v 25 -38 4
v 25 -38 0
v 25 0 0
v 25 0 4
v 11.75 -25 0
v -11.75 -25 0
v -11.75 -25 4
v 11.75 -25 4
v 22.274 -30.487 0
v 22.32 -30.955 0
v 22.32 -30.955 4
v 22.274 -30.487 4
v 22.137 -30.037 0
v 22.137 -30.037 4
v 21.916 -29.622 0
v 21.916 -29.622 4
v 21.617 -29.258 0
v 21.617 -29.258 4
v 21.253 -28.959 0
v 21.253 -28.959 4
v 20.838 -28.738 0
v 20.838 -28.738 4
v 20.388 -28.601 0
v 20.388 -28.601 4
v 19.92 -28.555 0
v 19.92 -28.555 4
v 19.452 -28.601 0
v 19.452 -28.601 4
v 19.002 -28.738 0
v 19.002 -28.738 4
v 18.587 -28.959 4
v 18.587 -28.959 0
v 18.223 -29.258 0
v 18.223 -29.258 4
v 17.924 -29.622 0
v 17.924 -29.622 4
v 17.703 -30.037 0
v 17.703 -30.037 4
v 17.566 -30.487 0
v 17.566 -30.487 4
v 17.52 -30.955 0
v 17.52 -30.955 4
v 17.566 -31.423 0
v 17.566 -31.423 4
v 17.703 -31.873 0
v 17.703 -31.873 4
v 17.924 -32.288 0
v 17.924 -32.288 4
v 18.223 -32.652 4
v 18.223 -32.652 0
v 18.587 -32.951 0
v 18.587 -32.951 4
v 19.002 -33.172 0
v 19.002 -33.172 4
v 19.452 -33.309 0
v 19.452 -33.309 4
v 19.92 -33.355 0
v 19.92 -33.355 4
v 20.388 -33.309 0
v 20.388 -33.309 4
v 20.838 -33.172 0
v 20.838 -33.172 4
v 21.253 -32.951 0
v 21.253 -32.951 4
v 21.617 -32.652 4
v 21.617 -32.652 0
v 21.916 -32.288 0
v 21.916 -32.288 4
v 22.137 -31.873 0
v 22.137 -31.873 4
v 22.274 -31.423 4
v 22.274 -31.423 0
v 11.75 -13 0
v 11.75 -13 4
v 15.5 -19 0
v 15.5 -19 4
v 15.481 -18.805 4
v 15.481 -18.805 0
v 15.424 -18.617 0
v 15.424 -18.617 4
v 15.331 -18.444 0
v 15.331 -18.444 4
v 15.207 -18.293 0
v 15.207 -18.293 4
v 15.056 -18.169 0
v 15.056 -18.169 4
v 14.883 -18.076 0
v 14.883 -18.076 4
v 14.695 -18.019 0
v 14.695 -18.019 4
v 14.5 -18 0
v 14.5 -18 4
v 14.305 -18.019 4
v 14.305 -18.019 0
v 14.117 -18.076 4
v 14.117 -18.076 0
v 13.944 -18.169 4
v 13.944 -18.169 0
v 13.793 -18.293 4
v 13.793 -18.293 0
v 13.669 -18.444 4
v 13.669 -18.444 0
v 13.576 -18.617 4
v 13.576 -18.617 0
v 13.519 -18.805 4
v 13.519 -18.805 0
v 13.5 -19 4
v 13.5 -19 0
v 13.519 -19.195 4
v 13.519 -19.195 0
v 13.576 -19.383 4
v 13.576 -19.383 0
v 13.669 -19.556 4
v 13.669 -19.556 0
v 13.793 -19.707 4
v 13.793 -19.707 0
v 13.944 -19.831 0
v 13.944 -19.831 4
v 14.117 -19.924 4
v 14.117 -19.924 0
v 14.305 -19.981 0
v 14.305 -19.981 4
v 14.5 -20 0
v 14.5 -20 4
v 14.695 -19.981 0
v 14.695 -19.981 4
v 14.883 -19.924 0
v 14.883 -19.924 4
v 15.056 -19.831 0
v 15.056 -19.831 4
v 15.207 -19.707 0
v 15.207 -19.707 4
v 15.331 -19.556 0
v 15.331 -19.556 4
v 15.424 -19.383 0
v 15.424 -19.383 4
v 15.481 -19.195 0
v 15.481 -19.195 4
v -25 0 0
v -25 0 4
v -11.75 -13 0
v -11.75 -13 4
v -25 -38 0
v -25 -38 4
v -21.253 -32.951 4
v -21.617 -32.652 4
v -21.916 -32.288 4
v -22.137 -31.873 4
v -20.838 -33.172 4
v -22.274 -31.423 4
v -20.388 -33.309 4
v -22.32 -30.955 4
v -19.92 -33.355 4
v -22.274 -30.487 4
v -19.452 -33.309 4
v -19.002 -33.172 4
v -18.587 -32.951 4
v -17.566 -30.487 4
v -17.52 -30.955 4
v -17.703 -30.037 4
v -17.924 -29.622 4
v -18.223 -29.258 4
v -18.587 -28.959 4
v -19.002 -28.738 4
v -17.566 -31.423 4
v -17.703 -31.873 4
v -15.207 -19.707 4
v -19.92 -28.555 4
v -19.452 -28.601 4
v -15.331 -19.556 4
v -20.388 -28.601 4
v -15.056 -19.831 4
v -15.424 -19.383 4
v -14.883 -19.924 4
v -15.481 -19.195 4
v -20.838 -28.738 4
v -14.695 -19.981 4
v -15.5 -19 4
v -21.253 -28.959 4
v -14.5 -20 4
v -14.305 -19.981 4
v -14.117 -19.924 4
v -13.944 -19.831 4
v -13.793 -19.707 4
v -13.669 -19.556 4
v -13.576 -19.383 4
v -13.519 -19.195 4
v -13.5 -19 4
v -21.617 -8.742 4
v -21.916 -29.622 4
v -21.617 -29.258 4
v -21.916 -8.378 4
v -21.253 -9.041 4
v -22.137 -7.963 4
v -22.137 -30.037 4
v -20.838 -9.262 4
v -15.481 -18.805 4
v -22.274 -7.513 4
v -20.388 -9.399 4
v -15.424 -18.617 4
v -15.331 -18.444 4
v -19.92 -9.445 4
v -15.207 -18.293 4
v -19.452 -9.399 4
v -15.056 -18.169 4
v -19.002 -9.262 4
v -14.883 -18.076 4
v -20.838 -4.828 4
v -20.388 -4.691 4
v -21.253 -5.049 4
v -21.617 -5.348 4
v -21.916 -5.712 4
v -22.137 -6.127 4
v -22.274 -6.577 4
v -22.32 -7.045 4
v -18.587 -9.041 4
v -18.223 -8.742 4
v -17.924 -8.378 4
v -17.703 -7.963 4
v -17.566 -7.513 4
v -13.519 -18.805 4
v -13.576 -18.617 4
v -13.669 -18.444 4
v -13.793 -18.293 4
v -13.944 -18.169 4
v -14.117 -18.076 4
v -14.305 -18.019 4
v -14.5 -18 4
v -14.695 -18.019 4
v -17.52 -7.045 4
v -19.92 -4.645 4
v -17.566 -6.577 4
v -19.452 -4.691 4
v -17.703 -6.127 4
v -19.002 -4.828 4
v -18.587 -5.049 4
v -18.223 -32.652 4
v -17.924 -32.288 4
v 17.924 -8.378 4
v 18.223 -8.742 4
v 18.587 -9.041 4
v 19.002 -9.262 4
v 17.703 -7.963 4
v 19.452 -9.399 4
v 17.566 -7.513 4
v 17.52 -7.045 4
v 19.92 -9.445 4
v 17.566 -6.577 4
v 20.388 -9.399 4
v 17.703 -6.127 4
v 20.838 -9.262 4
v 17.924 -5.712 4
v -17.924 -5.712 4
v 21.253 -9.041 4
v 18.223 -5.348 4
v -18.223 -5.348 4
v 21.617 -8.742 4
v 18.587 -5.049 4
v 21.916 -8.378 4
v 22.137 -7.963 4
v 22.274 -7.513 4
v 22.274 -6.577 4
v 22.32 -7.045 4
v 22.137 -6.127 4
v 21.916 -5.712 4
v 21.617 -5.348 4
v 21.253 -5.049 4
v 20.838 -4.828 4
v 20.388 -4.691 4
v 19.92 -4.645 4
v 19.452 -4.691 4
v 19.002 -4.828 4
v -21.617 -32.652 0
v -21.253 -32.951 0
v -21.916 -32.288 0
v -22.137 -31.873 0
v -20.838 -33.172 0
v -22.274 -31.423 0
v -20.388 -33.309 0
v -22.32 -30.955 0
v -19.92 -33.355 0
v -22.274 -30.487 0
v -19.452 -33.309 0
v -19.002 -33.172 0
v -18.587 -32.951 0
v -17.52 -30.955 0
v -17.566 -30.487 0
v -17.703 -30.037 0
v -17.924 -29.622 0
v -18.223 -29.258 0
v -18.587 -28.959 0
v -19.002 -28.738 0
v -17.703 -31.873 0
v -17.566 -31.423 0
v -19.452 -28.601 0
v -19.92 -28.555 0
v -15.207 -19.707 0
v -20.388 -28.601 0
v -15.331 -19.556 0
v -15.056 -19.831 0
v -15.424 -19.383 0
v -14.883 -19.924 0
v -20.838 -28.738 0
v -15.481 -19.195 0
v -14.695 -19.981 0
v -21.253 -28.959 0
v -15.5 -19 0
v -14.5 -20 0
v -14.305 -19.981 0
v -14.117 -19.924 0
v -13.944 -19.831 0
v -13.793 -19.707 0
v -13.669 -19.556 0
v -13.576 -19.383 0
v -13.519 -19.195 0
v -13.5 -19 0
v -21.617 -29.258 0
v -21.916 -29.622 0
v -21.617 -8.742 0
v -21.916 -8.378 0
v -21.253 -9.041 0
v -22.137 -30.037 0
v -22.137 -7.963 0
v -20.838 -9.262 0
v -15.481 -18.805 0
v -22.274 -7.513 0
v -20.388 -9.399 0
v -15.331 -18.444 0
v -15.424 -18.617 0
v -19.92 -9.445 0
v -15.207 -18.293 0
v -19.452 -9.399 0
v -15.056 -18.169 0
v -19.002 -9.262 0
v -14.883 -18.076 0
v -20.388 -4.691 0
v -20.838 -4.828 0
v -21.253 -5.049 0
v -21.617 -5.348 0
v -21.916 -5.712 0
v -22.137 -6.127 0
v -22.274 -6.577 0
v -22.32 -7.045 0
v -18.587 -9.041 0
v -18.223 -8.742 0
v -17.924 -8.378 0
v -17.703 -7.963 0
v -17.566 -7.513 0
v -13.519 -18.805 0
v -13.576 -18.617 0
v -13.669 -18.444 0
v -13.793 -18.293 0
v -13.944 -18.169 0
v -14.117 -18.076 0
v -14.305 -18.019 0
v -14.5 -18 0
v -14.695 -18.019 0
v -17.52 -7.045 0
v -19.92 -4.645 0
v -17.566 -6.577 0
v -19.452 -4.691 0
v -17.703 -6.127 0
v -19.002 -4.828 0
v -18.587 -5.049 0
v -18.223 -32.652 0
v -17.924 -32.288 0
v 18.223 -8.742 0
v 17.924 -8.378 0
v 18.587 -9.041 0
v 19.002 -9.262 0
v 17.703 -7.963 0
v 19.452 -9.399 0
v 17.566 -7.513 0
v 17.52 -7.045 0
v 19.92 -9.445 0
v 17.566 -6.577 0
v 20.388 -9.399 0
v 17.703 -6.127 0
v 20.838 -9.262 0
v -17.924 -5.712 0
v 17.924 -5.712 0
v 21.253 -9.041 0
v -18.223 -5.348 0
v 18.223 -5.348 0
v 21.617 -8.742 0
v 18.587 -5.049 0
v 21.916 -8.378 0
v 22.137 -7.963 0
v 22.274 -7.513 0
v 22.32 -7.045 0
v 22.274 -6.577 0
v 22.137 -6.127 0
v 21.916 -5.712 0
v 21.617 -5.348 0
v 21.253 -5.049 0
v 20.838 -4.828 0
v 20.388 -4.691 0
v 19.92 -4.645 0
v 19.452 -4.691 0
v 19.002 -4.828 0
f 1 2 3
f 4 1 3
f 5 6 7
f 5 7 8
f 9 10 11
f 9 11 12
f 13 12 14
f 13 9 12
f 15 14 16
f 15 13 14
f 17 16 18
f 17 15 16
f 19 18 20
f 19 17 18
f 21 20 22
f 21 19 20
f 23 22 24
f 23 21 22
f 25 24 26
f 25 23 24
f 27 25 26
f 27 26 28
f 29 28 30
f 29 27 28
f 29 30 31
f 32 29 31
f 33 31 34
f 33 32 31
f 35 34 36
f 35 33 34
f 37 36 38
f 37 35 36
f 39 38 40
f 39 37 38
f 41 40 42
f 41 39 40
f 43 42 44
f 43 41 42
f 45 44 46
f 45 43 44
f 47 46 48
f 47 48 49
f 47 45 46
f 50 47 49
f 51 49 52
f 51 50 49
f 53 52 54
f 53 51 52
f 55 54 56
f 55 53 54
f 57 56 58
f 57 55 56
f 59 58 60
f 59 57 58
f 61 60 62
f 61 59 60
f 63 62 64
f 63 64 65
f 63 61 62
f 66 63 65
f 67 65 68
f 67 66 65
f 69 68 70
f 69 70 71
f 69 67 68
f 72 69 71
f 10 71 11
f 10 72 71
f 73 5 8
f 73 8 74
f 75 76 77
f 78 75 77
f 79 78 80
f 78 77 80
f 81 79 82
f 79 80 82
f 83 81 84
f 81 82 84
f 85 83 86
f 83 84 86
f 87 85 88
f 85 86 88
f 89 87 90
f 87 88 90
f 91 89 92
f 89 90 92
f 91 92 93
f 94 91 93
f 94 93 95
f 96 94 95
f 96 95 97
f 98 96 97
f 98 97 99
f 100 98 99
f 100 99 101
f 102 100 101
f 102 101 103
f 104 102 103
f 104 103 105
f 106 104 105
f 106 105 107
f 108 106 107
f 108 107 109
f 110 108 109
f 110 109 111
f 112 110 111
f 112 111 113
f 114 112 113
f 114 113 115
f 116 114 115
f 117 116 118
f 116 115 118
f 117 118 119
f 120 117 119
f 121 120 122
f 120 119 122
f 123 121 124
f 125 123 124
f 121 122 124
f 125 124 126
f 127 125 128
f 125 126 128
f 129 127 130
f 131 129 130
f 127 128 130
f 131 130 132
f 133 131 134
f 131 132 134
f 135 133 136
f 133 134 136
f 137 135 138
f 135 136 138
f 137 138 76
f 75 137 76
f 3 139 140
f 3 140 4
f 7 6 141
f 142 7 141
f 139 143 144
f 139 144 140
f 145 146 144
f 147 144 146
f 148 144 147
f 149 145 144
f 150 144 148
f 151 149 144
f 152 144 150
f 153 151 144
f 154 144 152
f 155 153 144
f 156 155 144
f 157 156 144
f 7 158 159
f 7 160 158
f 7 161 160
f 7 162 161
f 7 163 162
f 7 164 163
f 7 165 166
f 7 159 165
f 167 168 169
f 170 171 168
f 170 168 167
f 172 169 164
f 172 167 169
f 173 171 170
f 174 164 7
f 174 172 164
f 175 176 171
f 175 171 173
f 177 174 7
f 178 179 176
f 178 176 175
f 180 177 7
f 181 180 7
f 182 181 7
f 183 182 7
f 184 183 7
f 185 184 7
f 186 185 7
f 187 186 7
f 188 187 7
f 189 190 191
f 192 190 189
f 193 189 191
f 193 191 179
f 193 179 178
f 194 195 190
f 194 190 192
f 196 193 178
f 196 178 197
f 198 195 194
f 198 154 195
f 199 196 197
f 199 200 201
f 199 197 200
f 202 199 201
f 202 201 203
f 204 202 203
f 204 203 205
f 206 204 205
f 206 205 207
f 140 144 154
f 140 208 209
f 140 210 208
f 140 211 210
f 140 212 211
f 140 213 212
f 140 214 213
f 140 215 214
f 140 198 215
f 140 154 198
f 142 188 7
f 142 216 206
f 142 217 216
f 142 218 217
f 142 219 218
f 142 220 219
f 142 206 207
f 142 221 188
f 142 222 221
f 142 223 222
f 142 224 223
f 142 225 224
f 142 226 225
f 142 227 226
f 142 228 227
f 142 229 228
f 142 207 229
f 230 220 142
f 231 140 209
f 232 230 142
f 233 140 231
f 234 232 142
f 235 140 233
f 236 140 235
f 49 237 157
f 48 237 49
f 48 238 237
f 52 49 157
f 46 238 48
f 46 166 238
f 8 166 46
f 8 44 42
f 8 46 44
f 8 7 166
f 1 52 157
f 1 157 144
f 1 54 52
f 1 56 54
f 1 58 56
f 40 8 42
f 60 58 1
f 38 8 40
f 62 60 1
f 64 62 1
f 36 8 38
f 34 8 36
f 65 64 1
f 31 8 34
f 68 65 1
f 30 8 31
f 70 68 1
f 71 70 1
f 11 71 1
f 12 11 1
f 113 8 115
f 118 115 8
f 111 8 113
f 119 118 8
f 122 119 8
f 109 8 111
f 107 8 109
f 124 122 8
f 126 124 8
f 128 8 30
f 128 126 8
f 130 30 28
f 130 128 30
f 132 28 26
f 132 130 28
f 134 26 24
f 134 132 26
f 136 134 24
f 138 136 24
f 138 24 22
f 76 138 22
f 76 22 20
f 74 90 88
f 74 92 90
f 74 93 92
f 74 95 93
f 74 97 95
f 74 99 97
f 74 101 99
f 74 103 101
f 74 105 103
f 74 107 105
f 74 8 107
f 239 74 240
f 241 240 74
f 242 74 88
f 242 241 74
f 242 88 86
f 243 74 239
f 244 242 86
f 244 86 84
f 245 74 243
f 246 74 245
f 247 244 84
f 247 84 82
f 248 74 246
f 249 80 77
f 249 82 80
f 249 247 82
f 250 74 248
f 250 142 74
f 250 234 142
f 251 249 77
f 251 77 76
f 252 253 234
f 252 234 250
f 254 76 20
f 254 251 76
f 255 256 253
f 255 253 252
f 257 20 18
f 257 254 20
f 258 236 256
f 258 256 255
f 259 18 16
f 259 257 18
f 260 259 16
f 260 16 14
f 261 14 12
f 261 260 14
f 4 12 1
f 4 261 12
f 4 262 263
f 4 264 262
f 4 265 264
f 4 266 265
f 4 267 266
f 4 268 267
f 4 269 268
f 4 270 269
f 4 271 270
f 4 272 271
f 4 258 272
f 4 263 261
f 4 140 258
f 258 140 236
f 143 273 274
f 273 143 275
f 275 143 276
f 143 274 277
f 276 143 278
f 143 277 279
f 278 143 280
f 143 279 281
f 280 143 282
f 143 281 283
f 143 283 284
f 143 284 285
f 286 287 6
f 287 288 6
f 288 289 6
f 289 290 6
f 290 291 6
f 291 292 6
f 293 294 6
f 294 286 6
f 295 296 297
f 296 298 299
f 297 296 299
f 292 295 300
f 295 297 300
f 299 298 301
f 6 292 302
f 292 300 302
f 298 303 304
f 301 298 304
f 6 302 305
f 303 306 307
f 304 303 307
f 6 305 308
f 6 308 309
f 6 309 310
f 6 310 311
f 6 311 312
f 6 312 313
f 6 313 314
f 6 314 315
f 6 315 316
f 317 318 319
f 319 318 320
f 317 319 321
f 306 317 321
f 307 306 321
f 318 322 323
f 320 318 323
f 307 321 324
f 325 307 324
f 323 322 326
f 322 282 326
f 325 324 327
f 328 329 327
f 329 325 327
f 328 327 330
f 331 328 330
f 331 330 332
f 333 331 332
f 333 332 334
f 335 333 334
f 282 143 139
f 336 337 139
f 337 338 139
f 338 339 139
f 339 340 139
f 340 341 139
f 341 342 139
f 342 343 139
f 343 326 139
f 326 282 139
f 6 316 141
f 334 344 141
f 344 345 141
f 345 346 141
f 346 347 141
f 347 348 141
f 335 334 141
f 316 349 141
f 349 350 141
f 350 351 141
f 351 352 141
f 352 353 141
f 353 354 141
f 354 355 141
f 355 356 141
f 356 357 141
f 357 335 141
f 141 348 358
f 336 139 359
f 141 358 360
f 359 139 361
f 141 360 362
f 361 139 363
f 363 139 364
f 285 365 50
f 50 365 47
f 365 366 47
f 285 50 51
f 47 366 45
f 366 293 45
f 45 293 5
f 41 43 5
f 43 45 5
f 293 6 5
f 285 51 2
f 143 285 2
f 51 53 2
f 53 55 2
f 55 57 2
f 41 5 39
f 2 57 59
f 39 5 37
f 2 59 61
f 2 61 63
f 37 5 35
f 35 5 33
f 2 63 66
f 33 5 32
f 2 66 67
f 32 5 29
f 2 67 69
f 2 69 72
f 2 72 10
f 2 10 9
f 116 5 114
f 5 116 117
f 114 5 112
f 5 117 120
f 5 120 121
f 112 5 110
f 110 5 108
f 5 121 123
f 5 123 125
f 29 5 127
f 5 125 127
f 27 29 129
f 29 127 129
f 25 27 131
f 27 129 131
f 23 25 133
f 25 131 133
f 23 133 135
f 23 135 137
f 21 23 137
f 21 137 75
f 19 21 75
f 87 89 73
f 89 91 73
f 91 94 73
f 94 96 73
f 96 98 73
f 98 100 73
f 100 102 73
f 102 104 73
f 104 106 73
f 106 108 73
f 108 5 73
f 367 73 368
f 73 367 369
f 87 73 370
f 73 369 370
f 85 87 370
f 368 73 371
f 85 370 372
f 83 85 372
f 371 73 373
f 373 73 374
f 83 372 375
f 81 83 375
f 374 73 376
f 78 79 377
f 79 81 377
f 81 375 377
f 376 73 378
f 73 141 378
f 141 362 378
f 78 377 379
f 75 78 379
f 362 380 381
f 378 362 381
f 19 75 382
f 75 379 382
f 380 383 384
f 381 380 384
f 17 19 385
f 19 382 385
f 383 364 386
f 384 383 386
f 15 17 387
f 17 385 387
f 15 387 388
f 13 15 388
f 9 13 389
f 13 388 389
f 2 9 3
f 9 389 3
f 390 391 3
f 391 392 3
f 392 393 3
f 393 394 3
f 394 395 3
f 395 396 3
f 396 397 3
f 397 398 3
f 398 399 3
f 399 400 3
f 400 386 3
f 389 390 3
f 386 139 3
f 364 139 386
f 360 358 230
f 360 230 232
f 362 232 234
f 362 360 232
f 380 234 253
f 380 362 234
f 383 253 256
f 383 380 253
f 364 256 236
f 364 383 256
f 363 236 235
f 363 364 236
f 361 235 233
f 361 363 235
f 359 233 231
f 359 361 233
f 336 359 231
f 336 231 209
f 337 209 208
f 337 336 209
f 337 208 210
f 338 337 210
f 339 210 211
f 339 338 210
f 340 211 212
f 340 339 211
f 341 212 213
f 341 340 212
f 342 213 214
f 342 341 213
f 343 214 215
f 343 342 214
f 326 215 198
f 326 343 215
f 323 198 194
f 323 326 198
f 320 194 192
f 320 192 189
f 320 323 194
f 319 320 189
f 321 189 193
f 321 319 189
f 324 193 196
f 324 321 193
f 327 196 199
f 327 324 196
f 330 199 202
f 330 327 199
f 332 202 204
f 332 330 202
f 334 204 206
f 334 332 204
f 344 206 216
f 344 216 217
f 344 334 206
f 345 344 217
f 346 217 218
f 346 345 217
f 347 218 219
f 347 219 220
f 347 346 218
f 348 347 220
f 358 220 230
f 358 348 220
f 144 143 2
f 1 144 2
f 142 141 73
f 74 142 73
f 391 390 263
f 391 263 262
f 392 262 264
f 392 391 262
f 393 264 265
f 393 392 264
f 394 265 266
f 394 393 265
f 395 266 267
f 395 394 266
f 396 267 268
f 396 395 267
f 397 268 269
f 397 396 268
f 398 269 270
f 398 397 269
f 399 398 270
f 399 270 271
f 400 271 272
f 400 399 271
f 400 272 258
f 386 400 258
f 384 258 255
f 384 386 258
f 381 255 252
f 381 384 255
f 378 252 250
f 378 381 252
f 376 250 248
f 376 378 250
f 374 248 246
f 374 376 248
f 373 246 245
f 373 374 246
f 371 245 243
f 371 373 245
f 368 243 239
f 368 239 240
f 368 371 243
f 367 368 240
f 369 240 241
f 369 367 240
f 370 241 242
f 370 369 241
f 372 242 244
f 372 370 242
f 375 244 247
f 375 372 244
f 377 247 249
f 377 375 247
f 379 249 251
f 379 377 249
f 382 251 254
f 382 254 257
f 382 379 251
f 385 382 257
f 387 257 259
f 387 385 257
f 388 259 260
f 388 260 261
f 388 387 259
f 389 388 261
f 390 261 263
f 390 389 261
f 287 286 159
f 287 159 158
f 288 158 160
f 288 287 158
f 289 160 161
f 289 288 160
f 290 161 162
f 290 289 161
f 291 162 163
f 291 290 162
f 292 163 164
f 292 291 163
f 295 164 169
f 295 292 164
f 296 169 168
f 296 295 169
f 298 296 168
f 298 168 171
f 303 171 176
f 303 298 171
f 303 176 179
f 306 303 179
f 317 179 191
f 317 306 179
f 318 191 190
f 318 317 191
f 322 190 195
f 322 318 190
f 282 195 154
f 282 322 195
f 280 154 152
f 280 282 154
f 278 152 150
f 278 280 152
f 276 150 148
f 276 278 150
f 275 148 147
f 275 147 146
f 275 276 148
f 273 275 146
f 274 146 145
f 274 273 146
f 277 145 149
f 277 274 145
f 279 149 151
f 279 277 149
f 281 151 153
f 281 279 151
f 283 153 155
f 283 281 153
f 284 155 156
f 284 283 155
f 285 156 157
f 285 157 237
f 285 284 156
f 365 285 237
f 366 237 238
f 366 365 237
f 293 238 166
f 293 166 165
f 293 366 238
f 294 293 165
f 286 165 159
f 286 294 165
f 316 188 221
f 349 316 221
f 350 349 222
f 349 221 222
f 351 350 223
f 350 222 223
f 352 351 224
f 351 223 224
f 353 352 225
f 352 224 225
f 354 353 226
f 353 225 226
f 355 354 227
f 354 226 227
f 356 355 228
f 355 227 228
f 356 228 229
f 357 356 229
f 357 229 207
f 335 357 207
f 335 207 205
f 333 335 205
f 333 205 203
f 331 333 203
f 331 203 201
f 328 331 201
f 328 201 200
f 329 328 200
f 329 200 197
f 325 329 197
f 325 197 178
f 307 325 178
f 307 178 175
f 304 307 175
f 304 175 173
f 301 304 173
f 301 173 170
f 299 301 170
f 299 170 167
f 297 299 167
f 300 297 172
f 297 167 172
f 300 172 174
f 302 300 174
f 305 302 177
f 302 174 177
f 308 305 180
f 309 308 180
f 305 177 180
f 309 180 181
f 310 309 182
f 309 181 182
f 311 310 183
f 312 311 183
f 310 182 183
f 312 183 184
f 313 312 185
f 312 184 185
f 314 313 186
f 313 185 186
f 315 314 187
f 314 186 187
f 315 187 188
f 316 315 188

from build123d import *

# Parameters (mm, degrees)
SKETCH1_W           = 50
SKETCH1_H           = 38
SKETCH1_R           = 2.4
SKETCH1_W_2         = 23.5
SKETCH1_H_2         = 12
BOSS_EXTRUDE1_DEPTH = 4
CUT_EXTRUDE1_REACH  = 6
SKETCH2_R           = 1


with BuildPart() as part:
    # Sketch1 → Boss-Extrude1 (new body)
    with BuildSketch(Plane.XY):
        with Locations((0, -19)):
            Rectangle(SKETCH1_W, SKETCH1_H)
        with Locations((-19.92, -7.045)):
            Circle(SKETCH1_R, mode=Mode.SUBTRACT)
        with Locations((-19.92, -30.955)):
            Circle(SKETCH1_R, mode=Mode.SUBTRACT)
        with Locations((19.92, -30.955)):
            Circle(SKETCH1_R, mode=Mode.SUBTRACT)
        with Locations((19.92, -7.045)):
            Circle(SKETCH1_R, mode=Mode.SUBTRACT)
        with Locations((0, -19)):
            Rectangle(SKETCH1_W_2, SKETCH1_H_2, mode=Mode.SUBTRACT)
    extrude(amount=BOSS_EXTRUDE1_DEPTH)

    # Sketch2 → Cut-Extrude1 (cut, up to next)
    with BuildSketch(Plane.XY.offset(4), mode=Mode.PRIVATE) as cut_extrude1_sk1:
        with Locations((-14.5, -19)):
            Circle(SKETCH2_R)
    cut_extrude1_tool1 = extrude(cut_extrude1_sk1.sketch, amount=-CUT_EXTRUDE1_REACH, mode=Mode.PRIVATE) & part.part
    add(cut_extrude1_tool1.solids().sort_by_distance((-14.5, -19, 4))[0], mode=Mode.SUBTRACT)
    # Sketch2 → Cut-Extrude1 (cut, up to next)
    with BuildSketch(Plane.XY.offset(4), mode=Mode.PRIVATE) as cut_extrude1_sk2:
        with Locations((14.5, -19)):
            Circle(SKETCH2_R)
    cut_extrude1_tool2 = extrude(cut_extrude1_sk2.sketch, amount=-CUT_EXTRUDE1_REACH, mode=Mode.PRIVATE) & part.part
    add(cut_extrude1_tool2.solids().sort_by_distance((14.5, -19, 4))[0], mode=Mode.SUBTRACT)


solid = part.part
